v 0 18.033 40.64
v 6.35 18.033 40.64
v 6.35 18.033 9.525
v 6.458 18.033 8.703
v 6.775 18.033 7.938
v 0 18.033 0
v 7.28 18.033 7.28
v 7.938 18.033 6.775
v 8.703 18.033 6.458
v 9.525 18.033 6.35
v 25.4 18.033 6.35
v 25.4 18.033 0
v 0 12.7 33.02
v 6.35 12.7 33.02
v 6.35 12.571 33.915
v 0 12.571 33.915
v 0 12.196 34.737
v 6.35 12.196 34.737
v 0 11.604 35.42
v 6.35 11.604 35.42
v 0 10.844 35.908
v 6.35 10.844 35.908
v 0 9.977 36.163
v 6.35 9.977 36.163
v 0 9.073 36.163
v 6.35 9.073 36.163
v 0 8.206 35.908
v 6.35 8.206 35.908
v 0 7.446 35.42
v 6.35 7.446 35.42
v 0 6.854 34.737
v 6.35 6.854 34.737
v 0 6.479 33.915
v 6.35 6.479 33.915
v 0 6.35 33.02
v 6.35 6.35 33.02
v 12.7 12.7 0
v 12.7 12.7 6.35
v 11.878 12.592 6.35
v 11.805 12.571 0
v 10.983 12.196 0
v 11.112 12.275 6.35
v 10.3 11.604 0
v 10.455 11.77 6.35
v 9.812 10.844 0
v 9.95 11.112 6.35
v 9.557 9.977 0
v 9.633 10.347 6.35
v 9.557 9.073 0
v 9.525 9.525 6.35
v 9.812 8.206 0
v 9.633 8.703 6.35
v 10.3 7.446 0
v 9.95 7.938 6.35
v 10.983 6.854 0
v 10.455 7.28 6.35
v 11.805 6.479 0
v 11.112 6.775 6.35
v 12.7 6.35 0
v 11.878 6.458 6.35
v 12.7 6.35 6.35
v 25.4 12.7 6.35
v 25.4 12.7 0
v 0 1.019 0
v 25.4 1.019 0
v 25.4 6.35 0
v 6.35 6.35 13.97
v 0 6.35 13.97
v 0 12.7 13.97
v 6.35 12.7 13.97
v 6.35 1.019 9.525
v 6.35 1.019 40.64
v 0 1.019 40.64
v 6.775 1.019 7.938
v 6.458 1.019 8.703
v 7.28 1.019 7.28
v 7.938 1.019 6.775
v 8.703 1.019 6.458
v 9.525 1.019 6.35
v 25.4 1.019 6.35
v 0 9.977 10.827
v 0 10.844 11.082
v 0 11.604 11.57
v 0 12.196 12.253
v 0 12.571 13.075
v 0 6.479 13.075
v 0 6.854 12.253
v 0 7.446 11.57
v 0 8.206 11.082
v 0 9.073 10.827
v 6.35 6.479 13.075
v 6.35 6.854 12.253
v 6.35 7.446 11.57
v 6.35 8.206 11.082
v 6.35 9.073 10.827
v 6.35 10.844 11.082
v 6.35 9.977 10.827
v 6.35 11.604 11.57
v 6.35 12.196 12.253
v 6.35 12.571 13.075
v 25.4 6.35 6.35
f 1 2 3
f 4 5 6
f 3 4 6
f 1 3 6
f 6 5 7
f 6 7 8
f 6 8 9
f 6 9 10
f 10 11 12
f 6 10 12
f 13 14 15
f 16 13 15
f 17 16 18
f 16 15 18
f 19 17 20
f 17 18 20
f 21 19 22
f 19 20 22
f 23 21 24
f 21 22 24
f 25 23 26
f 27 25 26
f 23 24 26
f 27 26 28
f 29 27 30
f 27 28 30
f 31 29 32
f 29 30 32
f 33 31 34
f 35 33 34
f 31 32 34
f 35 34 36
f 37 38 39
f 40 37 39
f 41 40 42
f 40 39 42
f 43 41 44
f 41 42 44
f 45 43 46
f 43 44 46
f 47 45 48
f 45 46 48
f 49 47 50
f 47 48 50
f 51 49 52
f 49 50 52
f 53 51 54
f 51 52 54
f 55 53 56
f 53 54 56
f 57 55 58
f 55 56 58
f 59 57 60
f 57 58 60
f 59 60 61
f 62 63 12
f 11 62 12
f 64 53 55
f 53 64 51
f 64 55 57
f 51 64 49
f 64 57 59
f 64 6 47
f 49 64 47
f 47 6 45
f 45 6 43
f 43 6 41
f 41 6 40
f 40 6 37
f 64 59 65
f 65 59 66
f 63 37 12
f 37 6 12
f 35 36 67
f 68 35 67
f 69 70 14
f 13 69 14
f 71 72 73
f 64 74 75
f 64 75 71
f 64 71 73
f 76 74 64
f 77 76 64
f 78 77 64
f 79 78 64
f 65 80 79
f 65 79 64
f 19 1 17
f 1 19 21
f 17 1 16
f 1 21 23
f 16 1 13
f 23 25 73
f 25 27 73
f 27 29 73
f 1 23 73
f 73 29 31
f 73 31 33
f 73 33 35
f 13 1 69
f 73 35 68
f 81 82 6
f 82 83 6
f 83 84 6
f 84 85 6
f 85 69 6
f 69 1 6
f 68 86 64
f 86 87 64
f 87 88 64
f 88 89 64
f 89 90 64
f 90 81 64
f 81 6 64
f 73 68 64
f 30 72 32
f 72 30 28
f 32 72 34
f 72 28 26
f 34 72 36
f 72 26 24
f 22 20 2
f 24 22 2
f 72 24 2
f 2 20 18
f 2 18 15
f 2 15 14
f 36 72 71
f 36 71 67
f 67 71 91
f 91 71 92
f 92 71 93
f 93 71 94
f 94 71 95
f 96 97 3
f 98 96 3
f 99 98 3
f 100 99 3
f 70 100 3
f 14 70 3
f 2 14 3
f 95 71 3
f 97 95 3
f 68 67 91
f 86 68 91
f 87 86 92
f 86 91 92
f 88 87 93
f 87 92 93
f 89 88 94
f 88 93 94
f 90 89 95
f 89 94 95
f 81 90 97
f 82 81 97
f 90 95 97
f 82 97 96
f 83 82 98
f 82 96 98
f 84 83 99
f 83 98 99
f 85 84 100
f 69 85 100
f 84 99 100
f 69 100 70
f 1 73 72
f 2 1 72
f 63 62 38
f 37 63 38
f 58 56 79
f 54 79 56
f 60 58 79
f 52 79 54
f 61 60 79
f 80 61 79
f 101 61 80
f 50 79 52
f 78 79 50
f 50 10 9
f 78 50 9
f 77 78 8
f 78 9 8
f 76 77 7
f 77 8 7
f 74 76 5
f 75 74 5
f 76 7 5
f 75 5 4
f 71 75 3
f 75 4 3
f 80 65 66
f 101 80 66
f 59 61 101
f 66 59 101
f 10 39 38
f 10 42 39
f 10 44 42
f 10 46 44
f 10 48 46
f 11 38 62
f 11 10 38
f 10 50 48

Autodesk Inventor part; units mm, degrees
ref_plane "YZ Plane" through (0, 0, 0) normal (1, 0, 0) x (0, 1, 0)
ref_plane "XZ Plane" through (0, 0, 0) normal (0, 1, 0) x (-1, 0, 0)
ref_plane "XY Plane" through (0, 0, 0) normal (0, 0, 1) x (1, 0, 0)
sketch "Sketch1" plane through (0, 0, 0) normal (0, 0, 1) x (1, 0, 0)
  line L0 (0, 0) -> (50.8, 0)
  line L1 (50.8, 0) -> (50.8, 19.05)
  line L2 (50.8, 19.05) -> (0, 19.05)
  line L3 (0, 19.05) -> (0, 0)
  dimension "d0" = 50.8
  dimension "d1" = 19.05
extrude "Extrusion1" add sketch "Sketch1" along normal blind 6.35
sketch "Sketch2" plane through (0, 0, 6.35) normal (0, 0, 1) x (1, 0, 0)
  line L0 (0, 19.05) -> (0, 0) projected
  line L1 (50.8, 19.05) -> (0, 19.05) projected
  line L2 (0, 0) -> (6.35, 0)
  line L3 (6.35, 0) -> (6.35, 19.05)
  line L4 (6.35, 19.05) -> (0, 19.05)
  line L5 (0, 19.05) -> (0, 0)
  dimension "d4" = 6.35
extrude "Extrusion2" add sketch "Sketch2" along normal blind 34.29
sketch "Sketch3" plane through (6.35, 0, 6.35) normal (1, 0, 0) x (0, 0, -1)
  line L0 (-26.67, 9.525) -> (-7.62, 9.525) construction
  line L1 (-26.67, 6.35) -> (-7.62, 6.35)
  line L2 (-7.62, 12.7) -> (-26.67, 12.7)
  arc A0 (-26.67, 12.7) -> (-26.67, 6.35) centre (-26.67, 9.525) ccw
  arc A1 (-7.62, 6.35) -> (-7.62, 12.7) centre (-7.62, 9.525) ccw
  point P0 (6.35, 0)
  point P1 (-17.145, 9.525)
  dimension "d7" = 9.525
  dimension "d8" = 6.35
extrude "Extrusion3" cut sketch "Sketch3" against normal blind 34.29
sketch "Sketch4" plane through (0, 0, 6.35) normal (0, 0, 1) x (1, 0, 0)
  line L0 (44.45, 9.525) -> (12.7, 9.525) construction
  line L1 (44.45, 12.7) -> (12.7, 12.7)
  line L2 (12.7, 6.35) -> (44.45, 6.35)
  arc A0 (44.45, 6.35) -> (44.45, 12.7) centre (44.45, 9.525) ccw
  arc A1 (12.7, 12.7) -> (12.7, 6.35) centre (12.7, 9.525) ccw
  point P0 (0, 0)
  point P1 (28.575, 9.525)
  dimension "d11" = 15.875
  dimension "d12" = 6.35
extrude "Extrusion4" cut sketch "Sketch4" against normal blind 34.29
fillet "Fillet1" radius 3.175 1 edges at (6.35, 9.525, 6.35)
sketch "Sketch5" plane through (50.8, 0, 0) normal (1, 0, 0) x (0, 0, -1)
  line L0 (0, 19.05) -> (-40.64, 19.05) projected
  line L1 (0, 19.05) -> (-41.8279, 19.05)
  line L2 (-41.8279, 19.05) -> (-41.8279, 18.0326)
  line L3 (-41.8279, 18.0326) -> (0, 18.0326)
  line L4 (0, 18.0326) -> (0, 19.05)
  line L5 (0, 19.05) -> (0, 0) projected
  line L6 (-40.64, 0) -> (-40.64, 19.05) projected
  line L7 (0, 0) -> (-40.64, 0)
  line L8 (-40.64, 0) -> (-40.64, 1.0192)
  line L9 (-40.64, 1.0192) -> (0, 1.0192)
  line L10 (0, 1.0192) -> (0, 0)
extrude "Extrusion5" cut sketch "Sketch5" against normal through all contours L4 L3 L6 L0 | L6 L3 L2 L1 | L5 L7 L6 L9
sketch "Sketch6" plane through (0, 0, 0) normal (0, 0, -1) x (-1, 0, 0)
  line L0 (-50.8, 18.0326) -> (-9.525, 18.0326) projected
  line L1 (-25.4, 18.0326) -> (-61.3669, 18.0326)
  line L2 (-61.3669, 18.0326) -> (-61.3669, -3.7914)
  line L3 (-61.3669, -3.7914) -> (-25.4, -3.7914)
  line L4 (-25.4, -3.7914) -> (-25.4, 18.0326)
  point P0 (0, 0)
extrude "Extrusion6" cut sketch "Sketch6" against normal through all
properties part number "BLKbackplaneBracketMid"
